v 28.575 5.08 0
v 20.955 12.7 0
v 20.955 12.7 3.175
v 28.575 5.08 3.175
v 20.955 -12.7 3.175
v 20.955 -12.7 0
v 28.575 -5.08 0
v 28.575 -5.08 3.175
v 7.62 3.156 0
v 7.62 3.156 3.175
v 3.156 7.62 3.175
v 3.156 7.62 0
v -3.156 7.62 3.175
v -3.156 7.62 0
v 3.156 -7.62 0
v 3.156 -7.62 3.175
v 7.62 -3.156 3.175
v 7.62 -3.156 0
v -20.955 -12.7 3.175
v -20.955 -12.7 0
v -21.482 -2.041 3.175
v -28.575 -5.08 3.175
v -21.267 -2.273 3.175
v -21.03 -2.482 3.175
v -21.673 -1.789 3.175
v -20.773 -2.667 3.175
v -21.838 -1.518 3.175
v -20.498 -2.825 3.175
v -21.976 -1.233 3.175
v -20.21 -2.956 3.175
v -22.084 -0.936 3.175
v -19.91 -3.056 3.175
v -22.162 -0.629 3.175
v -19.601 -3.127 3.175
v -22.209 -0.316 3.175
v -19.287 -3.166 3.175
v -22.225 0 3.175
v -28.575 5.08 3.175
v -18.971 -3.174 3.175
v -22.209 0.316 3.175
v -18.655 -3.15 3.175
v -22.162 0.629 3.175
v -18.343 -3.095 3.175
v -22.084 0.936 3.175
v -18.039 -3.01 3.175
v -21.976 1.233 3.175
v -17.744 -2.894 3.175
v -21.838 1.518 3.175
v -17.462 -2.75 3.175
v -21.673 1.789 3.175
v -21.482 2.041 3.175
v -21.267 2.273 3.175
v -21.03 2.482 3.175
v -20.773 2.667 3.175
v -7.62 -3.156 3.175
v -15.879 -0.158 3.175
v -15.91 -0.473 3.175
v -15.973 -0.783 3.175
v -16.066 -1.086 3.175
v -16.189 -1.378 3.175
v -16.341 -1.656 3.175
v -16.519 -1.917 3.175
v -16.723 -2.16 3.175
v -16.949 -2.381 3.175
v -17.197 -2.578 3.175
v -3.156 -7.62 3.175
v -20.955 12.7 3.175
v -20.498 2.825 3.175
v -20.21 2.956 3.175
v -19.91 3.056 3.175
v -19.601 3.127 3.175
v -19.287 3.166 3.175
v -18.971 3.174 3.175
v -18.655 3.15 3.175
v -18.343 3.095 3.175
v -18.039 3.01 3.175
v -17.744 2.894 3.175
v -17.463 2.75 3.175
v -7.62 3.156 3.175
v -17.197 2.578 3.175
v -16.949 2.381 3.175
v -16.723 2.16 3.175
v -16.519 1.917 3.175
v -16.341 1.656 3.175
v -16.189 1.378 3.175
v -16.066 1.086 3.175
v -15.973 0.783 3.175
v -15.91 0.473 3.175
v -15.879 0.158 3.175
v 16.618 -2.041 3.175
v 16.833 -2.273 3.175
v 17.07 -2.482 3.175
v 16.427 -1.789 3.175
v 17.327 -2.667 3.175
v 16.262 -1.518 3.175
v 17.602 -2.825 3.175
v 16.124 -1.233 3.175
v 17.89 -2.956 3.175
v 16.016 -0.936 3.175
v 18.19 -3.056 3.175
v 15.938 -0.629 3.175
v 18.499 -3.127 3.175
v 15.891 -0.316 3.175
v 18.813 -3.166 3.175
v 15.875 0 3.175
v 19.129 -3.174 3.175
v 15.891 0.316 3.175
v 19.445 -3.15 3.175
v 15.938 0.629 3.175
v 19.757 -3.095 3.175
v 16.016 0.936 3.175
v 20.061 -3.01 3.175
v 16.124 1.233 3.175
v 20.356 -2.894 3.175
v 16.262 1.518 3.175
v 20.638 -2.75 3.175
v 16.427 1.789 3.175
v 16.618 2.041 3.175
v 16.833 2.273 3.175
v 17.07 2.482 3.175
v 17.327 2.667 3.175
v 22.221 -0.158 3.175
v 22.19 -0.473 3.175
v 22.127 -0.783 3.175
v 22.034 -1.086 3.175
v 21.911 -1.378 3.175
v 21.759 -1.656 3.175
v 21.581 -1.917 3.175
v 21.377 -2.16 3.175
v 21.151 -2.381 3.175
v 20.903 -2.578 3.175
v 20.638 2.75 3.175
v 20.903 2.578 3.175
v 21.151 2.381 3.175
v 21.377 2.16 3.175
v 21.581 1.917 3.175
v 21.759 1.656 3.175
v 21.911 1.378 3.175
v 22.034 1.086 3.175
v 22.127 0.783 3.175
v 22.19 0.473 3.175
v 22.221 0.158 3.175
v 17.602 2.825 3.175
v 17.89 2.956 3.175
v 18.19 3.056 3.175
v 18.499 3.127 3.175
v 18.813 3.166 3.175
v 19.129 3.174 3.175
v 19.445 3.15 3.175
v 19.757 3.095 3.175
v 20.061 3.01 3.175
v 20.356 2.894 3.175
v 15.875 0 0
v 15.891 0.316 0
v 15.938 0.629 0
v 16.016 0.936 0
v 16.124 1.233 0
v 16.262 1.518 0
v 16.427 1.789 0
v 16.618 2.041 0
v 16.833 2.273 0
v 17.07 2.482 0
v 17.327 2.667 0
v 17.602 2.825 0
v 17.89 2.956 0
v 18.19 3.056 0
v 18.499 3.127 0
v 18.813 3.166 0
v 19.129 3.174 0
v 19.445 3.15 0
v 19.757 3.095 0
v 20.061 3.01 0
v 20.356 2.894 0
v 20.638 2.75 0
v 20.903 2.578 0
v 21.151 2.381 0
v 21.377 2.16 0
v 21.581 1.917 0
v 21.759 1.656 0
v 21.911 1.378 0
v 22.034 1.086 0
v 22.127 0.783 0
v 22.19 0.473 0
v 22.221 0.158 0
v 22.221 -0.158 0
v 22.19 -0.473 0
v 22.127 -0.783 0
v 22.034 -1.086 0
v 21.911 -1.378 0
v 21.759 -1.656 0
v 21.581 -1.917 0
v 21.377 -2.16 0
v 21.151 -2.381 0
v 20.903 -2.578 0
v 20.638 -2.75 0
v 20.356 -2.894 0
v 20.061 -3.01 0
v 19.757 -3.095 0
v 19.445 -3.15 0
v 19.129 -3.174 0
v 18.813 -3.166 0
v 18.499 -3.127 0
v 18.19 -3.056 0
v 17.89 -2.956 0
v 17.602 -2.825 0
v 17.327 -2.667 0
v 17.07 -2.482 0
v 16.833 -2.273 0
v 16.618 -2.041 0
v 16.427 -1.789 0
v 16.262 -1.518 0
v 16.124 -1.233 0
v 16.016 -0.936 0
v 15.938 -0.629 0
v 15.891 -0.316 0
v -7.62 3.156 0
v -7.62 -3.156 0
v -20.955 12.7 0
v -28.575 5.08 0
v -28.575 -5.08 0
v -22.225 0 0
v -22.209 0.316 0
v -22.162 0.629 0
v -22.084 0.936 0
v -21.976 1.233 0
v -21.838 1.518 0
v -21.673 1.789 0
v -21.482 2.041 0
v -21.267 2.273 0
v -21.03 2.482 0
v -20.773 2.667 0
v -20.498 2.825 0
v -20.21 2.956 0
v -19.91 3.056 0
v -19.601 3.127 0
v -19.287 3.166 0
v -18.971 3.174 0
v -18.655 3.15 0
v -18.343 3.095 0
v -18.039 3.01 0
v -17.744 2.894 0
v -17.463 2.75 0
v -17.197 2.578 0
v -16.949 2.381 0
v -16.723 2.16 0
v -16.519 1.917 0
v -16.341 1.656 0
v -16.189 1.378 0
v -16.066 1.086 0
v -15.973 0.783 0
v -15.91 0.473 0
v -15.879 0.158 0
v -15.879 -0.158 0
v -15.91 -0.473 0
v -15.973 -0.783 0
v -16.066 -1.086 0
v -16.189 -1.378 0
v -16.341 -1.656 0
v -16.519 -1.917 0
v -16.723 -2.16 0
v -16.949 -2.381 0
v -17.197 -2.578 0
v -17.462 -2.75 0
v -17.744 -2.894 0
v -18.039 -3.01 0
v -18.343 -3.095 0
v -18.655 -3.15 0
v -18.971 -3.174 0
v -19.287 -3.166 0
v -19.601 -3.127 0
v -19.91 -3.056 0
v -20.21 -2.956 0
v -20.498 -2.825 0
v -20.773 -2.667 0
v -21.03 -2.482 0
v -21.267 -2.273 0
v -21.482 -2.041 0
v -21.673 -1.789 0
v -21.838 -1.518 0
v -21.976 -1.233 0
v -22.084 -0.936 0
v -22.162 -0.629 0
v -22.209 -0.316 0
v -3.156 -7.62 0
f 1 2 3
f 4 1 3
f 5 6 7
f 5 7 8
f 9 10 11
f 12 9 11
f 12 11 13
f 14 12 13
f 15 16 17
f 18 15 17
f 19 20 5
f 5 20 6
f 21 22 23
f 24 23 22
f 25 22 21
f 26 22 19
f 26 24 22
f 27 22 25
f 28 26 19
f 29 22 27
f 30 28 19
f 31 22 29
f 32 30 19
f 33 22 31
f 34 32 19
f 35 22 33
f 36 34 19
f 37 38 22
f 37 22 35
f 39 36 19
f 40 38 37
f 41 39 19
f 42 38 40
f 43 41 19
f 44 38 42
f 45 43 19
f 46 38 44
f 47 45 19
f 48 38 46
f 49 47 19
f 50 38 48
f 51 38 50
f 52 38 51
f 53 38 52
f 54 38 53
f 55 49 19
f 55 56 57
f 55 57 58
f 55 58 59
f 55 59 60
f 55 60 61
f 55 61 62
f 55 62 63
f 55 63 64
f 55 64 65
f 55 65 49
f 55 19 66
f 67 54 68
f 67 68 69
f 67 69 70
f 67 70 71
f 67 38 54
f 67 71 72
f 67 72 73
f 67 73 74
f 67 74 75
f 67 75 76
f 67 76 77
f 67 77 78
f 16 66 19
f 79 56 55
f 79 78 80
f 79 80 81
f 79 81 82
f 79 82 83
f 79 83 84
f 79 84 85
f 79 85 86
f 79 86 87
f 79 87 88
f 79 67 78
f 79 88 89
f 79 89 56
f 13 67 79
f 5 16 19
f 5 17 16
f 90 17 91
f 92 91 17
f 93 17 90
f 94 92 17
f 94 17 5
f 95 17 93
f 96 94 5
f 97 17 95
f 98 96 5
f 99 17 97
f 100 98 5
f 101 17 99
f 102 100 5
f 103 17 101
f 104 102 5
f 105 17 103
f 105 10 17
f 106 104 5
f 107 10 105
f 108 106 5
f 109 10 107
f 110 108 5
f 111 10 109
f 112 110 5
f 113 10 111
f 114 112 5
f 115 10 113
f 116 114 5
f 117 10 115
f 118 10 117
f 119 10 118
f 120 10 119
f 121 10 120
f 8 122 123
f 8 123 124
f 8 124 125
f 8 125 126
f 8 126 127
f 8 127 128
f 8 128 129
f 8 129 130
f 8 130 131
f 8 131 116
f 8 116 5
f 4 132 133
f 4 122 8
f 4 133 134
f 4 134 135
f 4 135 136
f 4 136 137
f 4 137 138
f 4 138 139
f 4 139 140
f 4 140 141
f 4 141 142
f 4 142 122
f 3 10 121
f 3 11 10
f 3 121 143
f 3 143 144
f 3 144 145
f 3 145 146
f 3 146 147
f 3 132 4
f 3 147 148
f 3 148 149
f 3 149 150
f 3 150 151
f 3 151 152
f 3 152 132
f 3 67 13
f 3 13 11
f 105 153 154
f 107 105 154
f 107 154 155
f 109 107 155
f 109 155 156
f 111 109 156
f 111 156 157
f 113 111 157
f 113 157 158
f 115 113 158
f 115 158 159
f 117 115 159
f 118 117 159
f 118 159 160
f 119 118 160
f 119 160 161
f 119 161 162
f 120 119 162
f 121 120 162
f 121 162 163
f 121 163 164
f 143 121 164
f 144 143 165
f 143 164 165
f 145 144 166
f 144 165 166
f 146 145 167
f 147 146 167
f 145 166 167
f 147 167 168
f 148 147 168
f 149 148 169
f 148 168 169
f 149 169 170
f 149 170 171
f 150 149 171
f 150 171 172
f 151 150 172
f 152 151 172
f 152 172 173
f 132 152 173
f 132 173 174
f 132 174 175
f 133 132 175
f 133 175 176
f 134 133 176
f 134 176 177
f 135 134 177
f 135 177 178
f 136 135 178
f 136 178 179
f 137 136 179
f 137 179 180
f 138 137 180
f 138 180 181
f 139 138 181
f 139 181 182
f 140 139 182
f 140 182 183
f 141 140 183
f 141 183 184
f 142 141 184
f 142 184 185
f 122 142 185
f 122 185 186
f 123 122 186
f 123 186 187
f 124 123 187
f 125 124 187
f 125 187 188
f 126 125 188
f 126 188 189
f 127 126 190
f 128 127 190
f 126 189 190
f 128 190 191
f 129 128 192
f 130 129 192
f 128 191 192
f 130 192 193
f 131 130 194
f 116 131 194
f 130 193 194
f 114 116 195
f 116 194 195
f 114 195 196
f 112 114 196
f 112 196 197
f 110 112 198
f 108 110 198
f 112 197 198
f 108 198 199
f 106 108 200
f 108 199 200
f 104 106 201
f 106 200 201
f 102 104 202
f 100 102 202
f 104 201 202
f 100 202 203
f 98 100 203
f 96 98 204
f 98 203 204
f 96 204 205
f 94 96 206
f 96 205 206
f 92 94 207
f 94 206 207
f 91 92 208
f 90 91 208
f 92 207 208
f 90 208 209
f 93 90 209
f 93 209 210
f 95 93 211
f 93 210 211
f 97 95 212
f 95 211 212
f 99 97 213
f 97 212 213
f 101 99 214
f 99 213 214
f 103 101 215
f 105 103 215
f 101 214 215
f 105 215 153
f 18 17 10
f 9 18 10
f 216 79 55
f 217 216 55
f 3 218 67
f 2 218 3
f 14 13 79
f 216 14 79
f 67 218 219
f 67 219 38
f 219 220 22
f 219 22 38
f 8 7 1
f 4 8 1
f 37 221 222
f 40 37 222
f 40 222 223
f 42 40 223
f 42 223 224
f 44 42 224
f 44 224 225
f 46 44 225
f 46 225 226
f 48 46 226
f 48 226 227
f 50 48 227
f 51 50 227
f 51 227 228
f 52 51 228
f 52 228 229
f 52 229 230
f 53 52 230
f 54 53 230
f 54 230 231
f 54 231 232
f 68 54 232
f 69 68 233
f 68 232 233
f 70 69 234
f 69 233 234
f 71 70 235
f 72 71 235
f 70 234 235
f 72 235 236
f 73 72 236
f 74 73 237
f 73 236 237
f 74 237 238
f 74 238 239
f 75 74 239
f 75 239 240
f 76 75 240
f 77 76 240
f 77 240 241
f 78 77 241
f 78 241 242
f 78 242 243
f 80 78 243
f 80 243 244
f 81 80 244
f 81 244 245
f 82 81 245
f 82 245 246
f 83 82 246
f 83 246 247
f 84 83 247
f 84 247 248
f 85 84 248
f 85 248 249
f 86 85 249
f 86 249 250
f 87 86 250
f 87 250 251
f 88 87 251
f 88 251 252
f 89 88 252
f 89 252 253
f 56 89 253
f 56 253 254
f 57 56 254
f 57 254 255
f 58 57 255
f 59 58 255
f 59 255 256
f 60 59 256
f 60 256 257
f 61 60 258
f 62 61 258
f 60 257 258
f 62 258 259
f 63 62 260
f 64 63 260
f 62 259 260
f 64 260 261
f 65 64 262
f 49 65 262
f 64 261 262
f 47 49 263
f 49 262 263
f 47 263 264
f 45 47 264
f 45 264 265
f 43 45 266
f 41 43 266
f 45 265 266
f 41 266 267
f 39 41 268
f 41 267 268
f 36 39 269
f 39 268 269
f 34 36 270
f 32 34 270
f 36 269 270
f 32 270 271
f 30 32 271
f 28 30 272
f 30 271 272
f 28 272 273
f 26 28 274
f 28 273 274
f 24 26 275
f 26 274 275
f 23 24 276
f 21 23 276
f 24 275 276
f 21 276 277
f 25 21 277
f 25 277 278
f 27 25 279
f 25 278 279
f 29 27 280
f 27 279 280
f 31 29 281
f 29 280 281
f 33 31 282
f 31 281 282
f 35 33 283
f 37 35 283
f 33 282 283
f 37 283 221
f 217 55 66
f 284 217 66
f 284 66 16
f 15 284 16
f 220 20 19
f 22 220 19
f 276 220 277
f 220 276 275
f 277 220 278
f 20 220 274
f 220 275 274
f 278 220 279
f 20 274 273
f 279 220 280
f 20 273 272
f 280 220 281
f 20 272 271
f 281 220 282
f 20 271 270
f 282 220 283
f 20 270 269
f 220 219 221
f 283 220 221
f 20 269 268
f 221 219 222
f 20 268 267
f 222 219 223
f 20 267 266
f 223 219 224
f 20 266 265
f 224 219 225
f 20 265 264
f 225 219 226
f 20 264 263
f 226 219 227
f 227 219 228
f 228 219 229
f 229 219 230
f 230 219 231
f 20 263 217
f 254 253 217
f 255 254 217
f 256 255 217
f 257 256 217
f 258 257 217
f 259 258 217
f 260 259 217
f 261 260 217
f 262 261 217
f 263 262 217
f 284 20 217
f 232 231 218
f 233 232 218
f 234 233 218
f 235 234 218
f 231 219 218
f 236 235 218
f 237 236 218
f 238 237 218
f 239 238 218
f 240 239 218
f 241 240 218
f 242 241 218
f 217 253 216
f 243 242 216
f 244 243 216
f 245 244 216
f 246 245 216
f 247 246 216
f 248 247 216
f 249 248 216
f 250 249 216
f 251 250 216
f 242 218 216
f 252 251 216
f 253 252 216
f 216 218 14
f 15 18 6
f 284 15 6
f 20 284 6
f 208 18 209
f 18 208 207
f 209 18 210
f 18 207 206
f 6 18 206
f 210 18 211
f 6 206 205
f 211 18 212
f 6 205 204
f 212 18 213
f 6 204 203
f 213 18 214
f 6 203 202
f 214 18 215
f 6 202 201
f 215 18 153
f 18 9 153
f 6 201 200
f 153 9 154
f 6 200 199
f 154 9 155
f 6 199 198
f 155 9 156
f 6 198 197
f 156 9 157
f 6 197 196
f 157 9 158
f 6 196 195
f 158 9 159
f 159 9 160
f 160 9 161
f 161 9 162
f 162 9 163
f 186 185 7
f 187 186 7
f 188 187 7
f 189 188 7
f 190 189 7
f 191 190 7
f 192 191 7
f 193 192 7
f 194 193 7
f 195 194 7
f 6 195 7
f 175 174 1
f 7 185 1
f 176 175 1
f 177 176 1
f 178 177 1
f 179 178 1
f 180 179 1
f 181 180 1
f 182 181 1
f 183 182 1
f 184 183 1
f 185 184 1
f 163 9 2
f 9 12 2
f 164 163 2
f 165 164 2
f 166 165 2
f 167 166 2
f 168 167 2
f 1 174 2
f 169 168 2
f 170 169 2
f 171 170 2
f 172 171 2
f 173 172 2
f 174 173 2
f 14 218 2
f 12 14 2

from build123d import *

# Parameters (mm, degrees)
SKETCH2_W           = 57.15
SKETCH2_H           = 25.4
BOSS_EXTRUDE1_DEPTH = 3.175
HOLE1_D             = 6.35
CHAMFER1_SIZE       = 7.62
CUT_EXTRUDE1_DEPTH  = 32.430896424


with BuildPart() as part:
    # Sketch2 → Boss-Extrude1 (new body)
    with BuildSketch(Plane.XY):
        Rectangle(SKETCH2_W, SKETCH2_H)
    extrude(amount=BOSS_EXTRUDE1_DEPTH)

    # Hole1 (through all)
    with Locations(Plane.XY.offset(3.175)):
        with Locations((-19.05, 0), (19.05, 0)):
            Hole(HOLE1_D / 2)

    # Chamfer1
    chamfer1_edges = [part.edges().sort_by_distance(p)[0] for p in [
        (28.575, -12.7, 1.5875),
        (-28.575, -12.7, 1.5875),
        (-28.575, 12.7, 1.5875),
        (28.575, 12.7, 1.5875),
    ]]
    chamfer(chamfer1_edges, length=CHAMFER1_SIZE)

    # Sketch5 → Cut-Extrude1 (cut, through all)
    with BuildSketch(Plane.XY.offset(3.175)):
        Polygon((7.62, 3.156307345), (3.156307345, 7.62), (-3.156307345, 7.62), (-7.62, 3.156307345), (-7.62, -3.156307345), (-3.156307345, -7.62), (3.156307345, -7.62), (7.62, -3.156307345), align=None)
    extrude(amount=-CUT_EXTRUDE1_DEPTH, mode=Mode.SUBTRACT)


solid = part.part
